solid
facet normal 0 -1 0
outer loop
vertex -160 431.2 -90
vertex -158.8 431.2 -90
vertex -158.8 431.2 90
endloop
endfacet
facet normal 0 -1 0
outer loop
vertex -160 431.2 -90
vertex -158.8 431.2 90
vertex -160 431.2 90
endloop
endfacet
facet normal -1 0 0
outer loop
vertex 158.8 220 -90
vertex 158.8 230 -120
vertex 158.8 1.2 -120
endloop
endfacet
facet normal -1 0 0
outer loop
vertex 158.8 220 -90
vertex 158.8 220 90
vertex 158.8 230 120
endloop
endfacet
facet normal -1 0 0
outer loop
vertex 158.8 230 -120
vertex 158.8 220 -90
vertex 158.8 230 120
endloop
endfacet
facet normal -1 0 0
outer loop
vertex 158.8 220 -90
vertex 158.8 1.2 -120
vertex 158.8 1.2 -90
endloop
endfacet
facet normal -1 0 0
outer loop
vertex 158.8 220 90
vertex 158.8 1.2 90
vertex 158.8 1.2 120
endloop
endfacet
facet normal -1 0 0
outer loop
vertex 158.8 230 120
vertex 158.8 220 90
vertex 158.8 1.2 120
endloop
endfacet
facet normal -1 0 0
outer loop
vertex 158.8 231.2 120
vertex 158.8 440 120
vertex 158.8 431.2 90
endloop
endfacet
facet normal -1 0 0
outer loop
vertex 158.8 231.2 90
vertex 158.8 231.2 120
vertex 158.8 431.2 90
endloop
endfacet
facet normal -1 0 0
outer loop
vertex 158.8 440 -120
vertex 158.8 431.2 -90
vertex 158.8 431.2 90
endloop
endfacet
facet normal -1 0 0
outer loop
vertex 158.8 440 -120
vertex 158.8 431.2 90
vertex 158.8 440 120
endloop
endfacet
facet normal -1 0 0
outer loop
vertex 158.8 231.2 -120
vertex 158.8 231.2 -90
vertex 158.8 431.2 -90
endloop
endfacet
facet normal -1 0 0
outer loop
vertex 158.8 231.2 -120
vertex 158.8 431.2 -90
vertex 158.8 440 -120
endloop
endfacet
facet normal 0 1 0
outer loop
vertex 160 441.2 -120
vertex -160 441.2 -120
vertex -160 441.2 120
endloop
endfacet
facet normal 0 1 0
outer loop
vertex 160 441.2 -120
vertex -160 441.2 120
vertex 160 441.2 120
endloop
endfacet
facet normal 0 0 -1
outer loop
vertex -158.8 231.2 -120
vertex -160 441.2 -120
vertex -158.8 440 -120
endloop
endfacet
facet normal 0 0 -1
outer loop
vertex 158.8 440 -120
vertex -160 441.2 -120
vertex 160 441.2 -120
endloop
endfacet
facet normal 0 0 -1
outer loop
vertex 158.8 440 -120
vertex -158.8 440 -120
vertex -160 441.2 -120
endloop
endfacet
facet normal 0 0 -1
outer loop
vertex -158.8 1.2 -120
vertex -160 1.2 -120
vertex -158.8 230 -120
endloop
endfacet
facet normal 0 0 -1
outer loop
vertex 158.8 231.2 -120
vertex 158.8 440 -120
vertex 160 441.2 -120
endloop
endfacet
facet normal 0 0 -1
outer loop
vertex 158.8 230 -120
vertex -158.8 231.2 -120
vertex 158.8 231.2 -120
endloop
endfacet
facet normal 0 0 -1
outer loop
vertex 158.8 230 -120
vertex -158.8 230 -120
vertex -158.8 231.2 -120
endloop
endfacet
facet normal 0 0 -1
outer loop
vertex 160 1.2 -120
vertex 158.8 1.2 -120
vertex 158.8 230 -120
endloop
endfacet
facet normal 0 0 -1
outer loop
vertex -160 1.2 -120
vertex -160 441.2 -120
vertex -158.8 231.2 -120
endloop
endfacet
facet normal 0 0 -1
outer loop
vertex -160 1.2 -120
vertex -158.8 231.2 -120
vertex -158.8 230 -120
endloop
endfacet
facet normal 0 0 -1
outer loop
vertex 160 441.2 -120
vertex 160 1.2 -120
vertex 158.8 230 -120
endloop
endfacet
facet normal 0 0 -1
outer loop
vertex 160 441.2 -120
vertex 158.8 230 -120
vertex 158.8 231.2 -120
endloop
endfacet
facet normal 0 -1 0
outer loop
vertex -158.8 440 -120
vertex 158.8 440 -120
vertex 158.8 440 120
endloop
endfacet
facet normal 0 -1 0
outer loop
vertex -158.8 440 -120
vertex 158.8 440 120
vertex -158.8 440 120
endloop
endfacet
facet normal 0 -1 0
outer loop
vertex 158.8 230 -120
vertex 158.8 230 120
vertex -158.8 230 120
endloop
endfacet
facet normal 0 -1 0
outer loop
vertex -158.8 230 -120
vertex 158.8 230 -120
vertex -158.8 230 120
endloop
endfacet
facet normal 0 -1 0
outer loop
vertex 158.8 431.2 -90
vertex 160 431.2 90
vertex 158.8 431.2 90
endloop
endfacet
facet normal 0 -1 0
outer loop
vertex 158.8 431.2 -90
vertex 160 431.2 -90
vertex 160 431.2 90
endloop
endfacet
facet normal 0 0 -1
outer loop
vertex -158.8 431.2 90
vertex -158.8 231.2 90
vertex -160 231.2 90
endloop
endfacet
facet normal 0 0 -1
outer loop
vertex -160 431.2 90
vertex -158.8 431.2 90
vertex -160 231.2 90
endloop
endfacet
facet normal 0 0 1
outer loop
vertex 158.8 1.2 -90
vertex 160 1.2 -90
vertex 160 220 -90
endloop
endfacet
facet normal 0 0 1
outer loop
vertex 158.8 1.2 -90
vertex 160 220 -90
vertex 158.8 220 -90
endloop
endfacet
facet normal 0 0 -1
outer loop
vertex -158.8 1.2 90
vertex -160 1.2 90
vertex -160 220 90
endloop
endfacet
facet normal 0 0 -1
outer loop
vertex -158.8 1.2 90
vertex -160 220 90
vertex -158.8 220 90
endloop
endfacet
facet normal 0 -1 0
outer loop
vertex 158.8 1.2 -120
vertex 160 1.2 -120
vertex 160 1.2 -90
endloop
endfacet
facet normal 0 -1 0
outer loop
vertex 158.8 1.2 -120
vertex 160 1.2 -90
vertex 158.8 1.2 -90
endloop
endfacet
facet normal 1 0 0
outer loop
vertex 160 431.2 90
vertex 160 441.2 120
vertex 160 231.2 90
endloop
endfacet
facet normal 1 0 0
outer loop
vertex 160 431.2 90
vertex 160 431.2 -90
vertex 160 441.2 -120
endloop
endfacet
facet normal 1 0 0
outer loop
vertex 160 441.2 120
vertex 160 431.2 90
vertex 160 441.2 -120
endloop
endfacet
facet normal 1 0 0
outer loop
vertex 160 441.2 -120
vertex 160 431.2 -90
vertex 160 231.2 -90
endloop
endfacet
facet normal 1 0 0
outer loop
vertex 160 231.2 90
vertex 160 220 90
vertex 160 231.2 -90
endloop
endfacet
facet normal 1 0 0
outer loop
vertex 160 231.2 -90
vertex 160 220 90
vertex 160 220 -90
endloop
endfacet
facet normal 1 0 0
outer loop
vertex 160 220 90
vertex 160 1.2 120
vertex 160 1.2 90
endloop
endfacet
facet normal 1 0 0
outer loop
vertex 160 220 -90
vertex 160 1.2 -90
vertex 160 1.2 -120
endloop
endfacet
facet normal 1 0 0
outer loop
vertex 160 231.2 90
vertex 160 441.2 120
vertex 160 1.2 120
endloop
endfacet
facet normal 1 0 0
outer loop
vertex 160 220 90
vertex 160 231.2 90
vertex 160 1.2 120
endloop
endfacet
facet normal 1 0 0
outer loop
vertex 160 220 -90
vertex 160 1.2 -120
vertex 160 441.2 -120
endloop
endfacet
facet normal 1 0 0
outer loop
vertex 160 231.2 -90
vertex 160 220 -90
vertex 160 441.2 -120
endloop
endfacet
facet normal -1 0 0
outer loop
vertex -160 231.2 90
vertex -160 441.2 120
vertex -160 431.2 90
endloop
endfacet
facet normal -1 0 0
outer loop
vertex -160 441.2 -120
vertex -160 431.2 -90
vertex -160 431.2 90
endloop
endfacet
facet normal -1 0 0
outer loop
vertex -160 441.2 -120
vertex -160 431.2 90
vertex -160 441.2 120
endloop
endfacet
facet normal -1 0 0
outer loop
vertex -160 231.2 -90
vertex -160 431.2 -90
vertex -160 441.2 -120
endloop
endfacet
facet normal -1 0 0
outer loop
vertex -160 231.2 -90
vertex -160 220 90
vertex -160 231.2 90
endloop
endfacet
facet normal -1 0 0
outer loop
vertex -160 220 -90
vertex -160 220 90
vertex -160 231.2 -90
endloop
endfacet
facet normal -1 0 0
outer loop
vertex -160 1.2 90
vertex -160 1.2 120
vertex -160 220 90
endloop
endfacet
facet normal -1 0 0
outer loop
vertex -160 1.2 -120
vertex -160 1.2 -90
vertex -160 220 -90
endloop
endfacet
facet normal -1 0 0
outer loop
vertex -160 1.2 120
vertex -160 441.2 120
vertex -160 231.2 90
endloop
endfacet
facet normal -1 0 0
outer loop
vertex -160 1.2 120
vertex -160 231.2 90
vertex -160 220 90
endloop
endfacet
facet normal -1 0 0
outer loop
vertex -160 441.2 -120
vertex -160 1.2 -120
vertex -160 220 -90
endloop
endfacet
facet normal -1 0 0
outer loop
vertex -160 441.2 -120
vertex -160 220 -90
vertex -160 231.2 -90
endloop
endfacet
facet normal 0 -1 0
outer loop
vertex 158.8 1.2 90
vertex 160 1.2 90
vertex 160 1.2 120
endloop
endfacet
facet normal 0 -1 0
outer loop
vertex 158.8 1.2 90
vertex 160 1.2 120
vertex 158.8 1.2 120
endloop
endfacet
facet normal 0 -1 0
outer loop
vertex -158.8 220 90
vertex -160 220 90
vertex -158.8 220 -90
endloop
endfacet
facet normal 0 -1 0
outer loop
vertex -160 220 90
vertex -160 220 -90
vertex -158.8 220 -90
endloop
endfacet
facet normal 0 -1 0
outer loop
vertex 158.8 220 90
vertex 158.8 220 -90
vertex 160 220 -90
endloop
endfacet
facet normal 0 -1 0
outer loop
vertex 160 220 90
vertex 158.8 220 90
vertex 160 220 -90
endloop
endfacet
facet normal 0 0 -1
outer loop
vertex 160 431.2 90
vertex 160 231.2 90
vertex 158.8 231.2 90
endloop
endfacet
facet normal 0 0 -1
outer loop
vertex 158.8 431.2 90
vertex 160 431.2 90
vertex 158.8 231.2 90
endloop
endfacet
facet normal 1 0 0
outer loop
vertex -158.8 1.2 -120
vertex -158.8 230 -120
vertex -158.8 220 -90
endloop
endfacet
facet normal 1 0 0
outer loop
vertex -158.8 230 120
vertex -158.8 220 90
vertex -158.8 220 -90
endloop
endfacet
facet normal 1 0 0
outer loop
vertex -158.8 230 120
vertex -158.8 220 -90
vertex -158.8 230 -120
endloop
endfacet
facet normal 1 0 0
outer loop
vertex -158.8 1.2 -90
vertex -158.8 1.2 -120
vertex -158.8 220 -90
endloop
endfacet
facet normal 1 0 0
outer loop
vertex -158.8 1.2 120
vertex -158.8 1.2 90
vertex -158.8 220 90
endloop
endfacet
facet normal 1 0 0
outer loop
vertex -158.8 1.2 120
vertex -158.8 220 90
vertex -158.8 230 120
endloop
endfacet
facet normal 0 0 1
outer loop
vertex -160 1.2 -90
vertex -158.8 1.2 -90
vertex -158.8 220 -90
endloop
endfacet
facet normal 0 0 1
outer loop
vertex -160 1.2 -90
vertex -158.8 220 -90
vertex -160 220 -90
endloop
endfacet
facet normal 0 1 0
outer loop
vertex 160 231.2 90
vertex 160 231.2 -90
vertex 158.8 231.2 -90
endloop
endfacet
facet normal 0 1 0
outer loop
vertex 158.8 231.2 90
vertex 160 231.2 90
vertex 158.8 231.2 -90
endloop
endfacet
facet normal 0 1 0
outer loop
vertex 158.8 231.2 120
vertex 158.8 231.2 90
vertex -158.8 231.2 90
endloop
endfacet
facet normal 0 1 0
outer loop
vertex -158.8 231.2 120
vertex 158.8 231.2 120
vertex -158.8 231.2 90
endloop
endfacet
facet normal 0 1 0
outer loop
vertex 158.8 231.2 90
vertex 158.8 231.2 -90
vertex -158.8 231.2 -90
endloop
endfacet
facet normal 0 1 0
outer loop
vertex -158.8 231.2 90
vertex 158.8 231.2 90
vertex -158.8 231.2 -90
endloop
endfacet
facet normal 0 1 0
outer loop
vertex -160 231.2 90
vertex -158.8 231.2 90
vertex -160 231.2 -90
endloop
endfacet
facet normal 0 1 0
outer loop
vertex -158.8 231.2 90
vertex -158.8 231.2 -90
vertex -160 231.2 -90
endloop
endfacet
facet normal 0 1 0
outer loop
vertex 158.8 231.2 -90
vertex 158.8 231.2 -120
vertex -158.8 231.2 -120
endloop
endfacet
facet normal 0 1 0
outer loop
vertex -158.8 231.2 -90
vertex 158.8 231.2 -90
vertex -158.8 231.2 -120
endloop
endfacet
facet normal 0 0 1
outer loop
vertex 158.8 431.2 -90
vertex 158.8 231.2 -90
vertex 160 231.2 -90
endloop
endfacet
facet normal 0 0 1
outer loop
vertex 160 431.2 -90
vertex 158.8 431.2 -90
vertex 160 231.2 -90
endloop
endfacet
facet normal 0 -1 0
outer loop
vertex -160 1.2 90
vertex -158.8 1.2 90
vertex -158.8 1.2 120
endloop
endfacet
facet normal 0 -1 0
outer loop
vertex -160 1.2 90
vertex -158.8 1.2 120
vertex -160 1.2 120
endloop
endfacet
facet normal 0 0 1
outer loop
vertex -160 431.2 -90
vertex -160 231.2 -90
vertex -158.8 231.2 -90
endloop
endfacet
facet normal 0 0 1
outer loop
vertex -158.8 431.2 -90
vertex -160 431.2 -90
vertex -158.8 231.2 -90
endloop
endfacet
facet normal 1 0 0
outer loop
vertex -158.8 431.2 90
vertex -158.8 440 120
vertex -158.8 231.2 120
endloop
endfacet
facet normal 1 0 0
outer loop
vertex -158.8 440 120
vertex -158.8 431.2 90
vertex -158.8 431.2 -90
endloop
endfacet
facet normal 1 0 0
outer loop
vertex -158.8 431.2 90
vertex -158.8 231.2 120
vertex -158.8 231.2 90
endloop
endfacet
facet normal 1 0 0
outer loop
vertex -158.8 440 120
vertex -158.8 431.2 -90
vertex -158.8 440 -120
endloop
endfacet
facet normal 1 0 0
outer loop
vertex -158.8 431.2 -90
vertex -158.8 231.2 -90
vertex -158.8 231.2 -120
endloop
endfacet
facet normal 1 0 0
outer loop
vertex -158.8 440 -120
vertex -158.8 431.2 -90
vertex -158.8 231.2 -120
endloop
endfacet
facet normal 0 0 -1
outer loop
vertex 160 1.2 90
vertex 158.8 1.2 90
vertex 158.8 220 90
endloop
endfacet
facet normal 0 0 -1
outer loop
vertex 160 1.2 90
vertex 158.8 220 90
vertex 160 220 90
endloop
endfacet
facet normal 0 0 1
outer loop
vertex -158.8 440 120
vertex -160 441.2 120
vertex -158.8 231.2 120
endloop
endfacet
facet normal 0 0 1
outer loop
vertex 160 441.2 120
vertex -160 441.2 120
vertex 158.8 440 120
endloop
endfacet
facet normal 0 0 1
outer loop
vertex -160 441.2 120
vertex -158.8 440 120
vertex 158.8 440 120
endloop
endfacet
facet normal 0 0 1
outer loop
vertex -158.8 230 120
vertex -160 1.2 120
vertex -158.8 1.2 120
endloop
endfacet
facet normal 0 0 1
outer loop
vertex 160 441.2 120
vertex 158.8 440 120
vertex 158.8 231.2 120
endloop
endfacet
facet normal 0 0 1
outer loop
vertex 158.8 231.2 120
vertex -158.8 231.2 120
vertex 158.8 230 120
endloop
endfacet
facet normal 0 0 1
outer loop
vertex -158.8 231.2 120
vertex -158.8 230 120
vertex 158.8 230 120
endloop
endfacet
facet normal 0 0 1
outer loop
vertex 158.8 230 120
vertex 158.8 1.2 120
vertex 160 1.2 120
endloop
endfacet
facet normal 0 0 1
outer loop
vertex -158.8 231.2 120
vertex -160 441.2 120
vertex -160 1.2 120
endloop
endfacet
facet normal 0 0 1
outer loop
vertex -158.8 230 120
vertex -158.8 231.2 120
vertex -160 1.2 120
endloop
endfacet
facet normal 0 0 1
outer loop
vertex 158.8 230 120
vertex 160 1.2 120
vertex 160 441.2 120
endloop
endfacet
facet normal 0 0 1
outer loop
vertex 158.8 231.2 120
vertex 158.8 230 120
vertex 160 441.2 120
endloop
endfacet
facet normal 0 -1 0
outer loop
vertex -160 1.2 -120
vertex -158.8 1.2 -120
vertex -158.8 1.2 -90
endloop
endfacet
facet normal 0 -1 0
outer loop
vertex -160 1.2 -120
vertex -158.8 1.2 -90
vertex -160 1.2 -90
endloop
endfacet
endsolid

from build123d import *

# Parameters (mm, degrees)
ESBO_O1_W                = 320
ESBO_O1_H                = 240
RESSALTO_EXTRUS_O1_DEPTH = 440
CORTE_EXTRUS_O1_DEPTH    = 220
SKETCH4_W                = 320
SKETCH4_H                = 240
BOSS_EXTRUDE2_DEPTH      = 1.2
CUT_EXTRUDE1_DEPTH       = 10
CUT_EXTRUDE2_DEPTH       = 200
SKETCH7_W                = 317.6
SKETCH7_H                = 240
CUT_EXTRUDE3_DEPTH       = 8.8
SKETCH9_W                = 338.812461563
SKETCH9_H                = 258.873896412
CUT_EXTRUDE4_DEPTH       = 1.2


# Read off the part's stored shape, not the designer's step: Corte-extrusão1
with BuildPart() as part:
    # Esboço1 → Ressalto-extrusão1 (new body)
    with BuildSketch(Plane(origin=(0, 0, 0), x_dir=(1, 0, 0), z_dir=(0, 1, 0))):
        Rectangle(ESBO_O1_W, ESBO_O1_H)
    extrude(amount=RESSALTO_EXTRUS_O1_DEPTH)

    # Corte-extrusão1 outline → Corte-extrusão1 (cut)
    with BuildSketch(Plane(origin=(0, 0, 0), x_dir=(1, 0, 0), z_dir=(0, 1, 0))):
        Polygon((158.8, -120), (158.8, -90), (160, -90), (160, 90), (158.8, 90), (158.8, 120), (-158.8, 120), (-158.8, 90), (-160, 90), (-160, -90), (-158.8, -90), (-158.8, -120), align=None)
    extrude(amount=CORTE_EXTRUS_O1_DEPTH, mode=Mode.SUBTRACT)

    # Sketch4 → Boss-Extrude2 (add)
    with BuildSketch(Plane(origin=(0, 440, 0), x_dir=(1, 0, 0), z_dir=(0, 1, 0))):
        Rectangle(SKETCH4_W, SKETCH4_H)
    extrude(amount=BOSS_EXTRUDE2_DEPTH)

    # Esboço5 → Cut-Extrude1 (cut)
    with BuildSketch(Plane.XZ.offset(-220)):
        Polygon((158.8, -90), (158.8, -120), (-158.8, -120), (-158.8, 120), (158.8, 120), align=None)
    extrude(amount=-CUT_EXTRUDE1_DEPTH, mode=Mode.SUBTRACT)

    # Sketch6 → Cut-Extrude2 (cut)
    with BuildSketch(Plane(origin=(0, 231.2, 0), x_dir=(-1, 0, 0), z_dir=(0, -1, 0))):
        Polygon((158.8, -120), (158.8, -90), (160, -90), (160, 90), (158.8, 90), (158.8, 120), (-158.8, 120), (-158.8, 90), (-160, 90), (-160, -90), (-158.8, -90), (-158.8, -120), align=None)
    extrude(amount=-CUT_EXTRUDE2_DEPTH, mode=Mode.SUBTRACT)

    # Sketch7 → Cut-Extrude3 (cut)
    with BuildSketch(Plane(origin=(0, 431.2, 0), x_dir=(-1, 0, 0), z_dir=(0, -1, 0))):
        Rectangle(SKETCH7_W, SKETCH7_H)
    extrude(amount=-CUT_EXTRUDE3_DEPTH, mode=Mode.SUBTRACT)

    # Sketch9 → Cut-Extrude4 (cut)
    with BuildSketch(Plane(origin=(0, 0, 0), x_dir=(-1, 0, 0), z_dir=(0, -1, 0))):
        with Locations((2.117577884, -1.826723931)):
            Rectangle(SKETCH9_W, SKETCH9_H)
    extrude(amount=-CUT_EXTRUDE4_DEPTH, mode=Mode.SUBTRACT)


solid = part.part
